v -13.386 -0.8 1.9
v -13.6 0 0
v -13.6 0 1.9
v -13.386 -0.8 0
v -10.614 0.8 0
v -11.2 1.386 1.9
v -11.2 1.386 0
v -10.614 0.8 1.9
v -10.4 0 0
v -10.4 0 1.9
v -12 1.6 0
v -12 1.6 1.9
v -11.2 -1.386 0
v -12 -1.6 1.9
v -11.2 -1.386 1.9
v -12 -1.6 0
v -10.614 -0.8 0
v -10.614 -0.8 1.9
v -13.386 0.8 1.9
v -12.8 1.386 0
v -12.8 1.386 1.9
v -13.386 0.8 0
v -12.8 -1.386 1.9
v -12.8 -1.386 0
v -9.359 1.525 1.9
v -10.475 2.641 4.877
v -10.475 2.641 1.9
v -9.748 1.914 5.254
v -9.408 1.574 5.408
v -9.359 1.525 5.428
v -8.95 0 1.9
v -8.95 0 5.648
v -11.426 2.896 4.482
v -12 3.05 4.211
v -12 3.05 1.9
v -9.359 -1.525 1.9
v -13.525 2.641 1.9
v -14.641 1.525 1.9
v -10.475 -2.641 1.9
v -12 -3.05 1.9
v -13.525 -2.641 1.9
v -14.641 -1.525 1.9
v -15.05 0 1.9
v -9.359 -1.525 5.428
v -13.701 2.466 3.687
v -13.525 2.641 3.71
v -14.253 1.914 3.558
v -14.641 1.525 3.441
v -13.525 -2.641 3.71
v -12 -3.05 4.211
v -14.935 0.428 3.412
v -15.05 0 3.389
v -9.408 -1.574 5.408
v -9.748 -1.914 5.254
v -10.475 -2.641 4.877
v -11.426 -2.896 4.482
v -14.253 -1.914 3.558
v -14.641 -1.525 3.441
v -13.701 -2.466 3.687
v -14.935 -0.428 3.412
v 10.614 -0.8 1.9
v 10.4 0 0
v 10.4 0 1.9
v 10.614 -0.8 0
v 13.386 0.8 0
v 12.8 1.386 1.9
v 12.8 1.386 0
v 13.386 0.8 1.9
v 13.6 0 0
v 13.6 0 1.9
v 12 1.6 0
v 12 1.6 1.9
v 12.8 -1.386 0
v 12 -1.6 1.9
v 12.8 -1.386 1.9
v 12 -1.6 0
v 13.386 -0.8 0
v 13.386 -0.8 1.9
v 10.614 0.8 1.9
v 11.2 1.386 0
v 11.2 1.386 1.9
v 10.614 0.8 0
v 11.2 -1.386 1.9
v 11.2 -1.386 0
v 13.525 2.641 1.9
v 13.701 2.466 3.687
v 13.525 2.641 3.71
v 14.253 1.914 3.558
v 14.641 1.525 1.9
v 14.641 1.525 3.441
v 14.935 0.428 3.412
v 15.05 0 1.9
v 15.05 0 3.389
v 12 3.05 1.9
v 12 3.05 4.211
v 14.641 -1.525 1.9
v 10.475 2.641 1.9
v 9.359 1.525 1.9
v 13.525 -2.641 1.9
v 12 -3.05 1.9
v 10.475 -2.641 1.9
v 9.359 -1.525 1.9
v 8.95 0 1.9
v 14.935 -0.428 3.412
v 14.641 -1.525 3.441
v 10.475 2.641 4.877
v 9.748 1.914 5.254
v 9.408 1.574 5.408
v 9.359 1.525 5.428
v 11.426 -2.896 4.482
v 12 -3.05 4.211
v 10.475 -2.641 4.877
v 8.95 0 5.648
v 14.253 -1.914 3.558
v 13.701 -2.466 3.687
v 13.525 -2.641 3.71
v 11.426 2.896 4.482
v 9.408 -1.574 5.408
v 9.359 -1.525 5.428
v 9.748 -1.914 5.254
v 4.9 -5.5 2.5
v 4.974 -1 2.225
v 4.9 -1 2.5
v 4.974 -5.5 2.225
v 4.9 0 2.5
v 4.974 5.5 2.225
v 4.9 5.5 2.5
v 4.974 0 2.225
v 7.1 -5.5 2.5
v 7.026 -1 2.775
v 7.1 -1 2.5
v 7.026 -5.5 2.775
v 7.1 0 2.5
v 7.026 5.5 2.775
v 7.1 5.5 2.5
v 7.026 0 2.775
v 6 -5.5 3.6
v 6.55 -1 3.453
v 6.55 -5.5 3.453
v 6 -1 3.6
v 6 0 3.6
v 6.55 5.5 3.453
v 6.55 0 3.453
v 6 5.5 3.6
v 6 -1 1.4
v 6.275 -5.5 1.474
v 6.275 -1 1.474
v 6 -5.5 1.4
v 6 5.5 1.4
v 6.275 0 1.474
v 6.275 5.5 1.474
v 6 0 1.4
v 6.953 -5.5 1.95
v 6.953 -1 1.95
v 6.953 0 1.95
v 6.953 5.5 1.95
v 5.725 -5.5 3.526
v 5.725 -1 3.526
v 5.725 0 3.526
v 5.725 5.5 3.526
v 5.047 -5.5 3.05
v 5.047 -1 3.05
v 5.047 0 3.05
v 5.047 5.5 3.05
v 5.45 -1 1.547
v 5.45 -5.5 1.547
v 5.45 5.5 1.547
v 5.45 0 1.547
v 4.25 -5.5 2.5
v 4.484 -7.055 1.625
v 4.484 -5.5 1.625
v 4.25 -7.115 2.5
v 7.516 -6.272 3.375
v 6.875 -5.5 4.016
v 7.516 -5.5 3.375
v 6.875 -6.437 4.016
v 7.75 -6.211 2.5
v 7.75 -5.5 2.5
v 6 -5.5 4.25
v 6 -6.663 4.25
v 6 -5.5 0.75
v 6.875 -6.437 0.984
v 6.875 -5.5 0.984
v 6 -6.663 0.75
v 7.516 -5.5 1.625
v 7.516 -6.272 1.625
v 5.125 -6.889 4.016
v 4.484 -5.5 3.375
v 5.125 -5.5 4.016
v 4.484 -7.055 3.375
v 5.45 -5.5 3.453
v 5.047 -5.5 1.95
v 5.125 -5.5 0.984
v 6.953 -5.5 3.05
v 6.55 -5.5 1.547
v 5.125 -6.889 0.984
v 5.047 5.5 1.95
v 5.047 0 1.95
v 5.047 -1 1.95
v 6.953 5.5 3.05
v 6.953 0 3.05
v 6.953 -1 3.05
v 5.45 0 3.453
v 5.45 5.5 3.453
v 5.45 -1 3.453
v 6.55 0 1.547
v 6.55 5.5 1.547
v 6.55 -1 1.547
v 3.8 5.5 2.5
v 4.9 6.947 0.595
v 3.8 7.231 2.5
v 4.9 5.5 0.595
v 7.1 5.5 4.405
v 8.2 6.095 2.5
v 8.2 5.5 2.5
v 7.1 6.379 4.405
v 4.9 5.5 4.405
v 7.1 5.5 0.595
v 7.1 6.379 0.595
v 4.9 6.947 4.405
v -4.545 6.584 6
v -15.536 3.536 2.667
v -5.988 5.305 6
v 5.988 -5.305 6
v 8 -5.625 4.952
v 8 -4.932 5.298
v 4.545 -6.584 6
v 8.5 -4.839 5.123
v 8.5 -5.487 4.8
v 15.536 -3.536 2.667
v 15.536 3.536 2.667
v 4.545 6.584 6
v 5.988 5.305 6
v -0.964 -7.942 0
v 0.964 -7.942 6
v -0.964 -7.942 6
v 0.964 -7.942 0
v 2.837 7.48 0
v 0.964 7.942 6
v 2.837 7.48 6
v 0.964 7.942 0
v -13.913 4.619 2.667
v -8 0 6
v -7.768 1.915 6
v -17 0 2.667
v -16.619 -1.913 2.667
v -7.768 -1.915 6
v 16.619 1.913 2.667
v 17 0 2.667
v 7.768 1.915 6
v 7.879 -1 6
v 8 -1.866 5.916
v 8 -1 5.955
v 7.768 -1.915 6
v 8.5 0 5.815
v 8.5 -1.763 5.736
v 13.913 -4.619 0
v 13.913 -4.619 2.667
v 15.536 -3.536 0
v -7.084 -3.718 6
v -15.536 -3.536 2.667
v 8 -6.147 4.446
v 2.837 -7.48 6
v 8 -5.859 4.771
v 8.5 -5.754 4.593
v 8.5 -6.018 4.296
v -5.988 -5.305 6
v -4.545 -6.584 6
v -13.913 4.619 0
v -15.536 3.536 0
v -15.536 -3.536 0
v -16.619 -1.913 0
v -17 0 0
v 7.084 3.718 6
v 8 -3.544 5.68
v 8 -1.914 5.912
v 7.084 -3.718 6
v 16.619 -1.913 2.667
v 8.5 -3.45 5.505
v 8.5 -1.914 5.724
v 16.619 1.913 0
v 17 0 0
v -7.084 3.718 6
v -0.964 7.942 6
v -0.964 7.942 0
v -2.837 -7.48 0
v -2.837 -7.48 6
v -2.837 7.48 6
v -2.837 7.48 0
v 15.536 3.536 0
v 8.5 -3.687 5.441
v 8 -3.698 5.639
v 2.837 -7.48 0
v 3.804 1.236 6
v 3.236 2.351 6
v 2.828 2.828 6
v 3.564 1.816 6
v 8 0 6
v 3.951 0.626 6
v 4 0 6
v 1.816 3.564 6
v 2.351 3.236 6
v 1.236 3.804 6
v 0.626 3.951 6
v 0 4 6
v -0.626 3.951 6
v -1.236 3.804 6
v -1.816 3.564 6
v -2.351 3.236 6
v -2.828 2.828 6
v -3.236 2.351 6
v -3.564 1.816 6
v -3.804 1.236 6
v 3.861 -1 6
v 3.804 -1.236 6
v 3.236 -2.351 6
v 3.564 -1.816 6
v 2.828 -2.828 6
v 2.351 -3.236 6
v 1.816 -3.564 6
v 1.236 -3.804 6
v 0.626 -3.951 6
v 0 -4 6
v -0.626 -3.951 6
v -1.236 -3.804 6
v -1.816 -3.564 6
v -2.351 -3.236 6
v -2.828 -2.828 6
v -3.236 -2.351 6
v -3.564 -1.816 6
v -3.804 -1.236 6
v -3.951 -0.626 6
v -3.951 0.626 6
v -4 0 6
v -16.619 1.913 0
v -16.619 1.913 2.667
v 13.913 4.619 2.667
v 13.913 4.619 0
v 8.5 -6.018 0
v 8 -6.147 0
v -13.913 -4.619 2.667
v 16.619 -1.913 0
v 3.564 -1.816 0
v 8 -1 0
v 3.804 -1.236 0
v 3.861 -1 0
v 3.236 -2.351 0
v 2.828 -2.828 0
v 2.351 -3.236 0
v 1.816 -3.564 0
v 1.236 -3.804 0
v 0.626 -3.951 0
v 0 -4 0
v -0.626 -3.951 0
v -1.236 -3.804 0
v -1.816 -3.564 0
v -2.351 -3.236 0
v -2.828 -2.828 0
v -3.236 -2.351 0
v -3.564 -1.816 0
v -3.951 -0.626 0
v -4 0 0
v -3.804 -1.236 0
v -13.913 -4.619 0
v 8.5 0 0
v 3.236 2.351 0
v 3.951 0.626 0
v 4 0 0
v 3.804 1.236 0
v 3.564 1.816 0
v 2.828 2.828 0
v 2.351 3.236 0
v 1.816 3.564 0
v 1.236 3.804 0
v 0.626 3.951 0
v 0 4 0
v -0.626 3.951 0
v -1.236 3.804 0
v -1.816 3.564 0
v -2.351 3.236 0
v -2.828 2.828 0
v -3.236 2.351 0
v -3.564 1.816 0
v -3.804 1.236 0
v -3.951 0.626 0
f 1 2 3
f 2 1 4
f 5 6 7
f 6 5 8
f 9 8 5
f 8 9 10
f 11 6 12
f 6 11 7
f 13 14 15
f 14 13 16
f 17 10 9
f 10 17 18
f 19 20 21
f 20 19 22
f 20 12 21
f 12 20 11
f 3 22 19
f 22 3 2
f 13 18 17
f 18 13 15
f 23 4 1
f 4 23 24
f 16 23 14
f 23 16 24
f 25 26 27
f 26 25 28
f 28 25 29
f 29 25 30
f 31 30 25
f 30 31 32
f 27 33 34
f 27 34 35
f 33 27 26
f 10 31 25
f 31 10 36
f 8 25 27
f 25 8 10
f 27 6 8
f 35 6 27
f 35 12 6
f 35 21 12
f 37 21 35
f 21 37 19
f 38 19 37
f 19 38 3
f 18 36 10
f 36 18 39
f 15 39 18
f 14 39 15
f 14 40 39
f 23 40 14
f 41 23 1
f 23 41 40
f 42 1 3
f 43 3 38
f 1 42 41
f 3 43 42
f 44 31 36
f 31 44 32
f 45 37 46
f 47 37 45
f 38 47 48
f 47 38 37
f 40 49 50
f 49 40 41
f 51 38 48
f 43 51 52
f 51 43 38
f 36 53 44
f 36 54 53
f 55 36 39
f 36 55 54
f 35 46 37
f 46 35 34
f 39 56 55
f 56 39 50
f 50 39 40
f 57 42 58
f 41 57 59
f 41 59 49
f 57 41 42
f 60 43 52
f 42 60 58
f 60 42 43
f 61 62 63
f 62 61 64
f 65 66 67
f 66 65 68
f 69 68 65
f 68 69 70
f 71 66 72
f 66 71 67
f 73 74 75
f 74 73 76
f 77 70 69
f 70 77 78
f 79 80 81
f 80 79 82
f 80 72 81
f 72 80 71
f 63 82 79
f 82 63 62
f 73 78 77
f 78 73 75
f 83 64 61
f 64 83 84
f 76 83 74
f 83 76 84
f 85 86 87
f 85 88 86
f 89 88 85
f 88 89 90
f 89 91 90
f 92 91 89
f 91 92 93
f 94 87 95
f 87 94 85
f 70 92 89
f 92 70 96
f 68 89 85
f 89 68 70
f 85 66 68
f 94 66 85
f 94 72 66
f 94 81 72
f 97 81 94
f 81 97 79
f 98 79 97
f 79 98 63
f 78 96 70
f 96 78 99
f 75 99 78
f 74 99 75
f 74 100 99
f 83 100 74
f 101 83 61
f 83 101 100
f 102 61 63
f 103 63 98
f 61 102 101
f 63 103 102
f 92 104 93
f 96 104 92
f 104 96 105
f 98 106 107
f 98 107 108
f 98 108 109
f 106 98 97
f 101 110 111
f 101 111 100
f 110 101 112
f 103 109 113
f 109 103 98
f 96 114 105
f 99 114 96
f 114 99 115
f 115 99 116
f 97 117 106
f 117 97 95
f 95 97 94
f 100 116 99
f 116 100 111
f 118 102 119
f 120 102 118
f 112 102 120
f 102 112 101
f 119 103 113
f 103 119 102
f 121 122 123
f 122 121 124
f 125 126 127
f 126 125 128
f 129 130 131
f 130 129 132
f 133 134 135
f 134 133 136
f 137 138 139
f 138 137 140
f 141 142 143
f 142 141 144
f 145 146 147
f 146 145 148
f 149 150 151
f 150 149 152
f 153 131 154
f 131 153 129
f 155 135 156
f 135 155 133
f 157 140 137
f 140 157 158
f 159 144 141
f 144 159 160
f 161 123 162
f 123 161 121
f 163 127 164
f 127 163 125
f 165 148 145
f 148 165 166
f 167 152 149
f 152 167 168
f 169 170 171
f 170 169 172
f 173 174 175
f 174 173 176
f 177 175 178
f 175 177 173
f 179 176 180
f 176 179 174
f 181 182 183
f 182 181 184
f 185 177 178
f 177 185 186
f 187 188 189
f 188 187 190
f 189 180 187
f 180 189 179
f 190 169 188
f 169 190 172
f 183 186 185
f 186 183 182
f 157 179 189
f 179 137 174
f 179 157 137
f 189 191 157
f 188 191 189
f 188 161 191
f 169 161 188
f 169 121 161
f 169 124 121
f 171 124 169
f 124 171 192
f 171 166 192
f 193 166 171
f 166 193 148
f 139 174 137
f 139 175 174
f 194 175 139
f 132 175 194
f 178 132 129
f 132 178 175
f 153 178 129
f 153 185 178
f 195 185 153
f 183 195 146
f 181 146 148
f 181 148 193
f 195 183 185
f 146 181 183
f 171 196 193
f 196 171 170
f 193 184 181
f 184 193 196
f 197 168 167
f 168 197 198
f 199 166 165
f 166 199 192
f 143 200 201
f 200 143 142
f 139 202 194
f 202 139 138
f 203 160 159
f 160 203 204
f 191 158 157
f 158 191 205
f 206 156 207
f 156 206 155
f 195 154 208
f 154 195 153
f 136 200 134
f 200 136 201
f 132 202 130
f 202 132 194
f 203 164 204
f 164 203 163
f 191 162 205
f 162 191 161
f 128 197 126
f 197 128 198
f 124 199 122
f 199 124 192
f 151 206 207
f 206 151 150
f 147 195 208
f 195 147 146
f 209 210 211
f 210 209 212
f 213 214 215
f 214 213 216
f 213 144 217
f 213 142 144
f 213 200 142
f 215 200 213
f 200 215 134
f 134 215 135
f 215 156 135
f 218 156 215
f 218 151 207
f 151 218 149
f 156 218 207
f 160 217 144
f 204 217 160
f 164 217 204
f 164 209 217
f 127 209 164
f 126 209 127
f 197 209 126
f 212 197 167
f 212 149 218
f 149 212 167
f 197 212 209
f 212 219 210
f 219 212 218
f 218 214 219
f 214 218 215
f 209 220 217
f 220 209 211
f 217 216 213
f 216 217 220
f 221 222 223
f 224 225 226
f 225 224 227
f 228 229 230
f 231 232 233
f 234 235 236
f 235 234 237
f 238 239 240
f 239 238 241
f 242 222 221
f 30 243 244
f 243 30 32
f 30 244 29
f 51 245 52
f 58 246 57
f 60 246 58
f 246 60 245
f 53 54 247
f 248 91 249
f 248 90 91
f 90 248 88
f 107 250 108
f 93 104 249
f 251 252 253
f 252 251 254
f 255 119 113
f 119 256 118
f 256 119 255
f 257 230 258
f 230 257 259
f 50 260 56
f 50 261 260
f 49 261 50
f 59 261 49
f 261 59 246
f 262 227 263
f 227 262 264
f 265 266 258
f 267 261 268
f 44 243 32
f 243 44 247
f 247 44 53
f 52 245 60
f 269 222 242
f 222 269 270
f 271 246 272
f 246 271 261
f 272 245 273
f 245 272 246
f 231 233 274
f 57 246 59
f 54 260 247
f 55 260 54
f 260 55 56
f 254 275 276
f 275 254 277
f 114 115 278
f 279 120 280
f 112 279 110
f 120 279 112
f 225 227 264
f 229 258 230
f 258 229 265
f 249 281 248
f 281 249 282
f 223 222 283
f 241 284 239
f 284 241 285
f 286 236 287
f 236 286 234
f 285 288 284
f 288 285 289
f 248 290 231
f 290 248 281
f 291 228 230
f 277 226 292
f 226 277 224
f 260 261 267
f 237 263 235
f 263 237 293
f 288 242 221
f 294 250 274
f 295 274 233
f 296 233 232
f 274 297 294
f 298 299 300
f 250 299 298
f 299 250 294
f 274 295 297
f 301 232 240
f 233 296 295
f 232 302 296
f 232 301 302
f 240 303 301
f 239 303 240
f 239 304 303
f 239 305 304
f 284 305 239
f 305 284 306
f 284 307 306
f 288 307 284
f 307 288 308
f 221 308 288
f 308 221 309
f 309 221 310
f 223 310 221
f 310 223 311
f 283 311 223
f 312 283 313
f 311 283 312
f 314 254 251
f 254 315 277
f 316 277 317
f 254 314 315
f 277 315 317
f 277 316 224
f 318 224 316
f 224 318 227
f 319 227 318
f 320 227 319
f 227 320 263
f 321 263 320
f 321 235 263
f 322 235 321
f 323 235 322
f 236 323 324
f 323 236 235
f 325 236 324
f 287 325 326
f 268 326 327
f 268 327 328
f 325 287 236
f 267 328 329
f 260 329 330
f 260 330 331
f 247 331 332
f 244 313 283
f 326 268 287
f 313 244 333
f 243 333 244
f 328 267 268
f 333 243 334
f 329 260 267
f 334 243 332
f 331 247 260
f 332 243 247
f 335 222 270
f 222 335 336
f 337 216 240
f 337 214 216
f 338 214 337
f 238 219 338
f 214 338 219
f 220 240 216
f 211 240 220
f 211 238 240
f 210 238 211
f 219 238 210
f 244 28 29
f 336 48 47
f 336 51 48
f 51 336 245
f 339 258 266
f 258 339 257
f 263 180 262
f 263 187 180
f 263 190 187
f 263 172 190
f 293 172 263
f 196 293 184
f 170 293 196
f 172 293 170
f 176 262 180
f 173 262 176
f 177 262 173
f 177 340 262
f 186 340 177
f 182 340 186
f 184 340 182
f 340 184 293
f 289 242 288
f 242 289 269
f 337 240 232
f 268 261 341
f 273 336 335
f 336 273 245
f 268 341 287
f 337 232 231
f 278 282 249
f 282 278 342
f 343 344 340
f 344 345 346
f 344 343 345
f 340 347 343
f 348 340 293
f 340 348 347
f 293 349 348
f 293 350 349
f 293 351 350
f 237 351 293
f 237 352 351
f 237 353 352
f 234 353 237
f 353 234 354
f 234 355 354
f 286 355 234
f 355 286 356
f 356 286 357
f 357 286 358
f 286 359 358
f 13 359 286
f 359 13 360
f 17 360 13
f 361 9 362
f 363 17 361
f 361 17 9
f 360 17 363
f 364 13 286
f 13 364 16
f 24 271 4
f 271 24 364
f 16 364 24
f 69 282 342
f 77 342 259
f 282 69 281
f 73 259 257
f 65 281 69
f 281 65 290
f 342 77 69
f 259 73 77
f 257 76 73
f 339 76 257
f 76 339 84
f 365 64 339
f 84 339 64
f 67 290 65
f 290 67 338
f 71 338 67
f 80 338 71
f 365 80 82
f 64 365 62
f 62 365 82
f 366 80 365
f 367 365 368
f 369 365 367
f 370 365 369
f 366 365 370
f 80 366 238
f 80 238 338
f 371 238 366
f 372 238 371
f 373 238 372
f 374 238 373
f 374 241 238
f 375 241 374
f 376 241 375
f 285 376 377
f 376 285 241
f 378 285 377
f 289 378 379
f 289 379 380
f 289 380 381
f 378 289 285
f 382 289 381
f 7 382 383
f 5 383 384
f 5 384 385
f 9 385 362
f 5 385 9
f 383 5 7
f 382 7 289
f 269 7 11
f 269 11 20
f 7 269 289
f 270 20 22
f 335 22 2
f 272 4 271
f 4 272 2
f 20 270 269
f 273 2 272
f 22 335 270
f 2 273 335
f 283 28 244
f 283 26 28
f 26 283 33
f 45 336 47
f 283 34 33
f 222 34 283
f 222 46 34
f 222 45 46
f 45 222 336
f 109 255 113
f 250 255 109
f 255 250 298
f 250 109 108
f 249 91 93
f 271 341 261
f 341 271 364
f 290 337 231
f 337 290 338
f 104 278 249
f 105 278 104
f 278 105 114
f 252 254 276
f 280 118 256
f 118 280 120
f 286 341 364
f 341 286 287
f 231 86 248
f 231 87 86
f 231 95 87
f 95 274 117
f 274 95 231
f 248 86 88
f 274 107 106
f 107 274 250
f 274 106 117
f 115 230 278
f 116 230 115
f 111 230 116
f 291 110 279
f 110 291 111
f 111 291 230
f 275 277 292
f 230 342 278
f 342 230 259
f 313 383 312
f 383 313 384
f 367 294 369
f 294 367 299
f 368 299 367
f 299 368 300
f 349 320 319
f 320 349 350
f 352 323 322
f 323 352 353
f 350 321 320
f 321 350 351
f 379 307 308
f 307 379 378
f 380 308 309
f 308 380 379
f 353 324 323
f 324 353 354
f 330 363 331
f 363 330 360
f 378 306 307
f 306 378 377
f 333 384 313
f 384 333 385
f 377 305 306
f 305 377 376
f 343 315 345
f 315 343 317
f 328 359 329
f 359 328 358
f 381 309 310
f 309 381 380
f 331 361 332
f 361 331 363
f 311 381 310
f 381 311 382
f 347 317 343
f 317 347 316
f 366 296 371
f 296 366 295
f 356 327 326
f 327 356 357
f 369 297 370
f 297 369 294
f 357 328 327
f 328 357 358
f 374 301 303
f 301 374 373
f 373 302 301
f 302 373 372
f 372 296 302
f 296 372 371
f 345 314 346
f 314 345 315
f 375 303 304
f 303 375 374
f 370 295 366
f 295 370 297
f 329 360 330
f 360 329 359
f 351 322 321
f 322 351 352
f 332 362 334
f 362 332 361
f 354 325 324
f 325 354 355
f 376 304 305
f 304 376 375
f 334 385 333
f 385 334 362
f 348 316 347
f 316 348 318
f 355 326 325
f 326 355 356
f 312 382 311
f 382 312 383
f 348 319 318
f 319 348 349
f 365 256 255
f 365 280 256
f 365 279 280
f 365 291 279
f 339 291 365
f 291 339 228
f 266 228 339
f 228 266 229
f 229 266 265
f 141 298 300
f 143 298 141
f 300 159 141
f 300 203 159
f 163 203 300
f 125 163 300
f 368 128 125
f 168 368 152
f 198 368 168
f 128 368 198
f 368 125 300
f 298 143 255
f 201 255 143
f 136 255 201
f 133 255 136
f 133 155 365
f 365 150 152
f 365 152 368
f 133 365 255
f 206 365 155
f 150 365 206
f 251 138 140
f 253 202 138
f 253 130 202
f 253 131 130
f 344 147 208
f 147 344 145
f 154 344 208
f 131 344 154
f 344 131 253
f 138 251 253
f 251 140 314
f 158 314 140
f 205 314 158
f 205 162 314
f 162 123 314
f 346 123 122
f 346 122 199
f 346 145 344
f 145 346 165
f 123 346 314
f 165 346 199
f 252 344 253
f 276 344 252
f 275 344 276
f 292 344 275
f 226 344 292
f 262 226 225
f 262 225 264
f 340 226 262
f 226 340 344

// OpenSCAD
// Rod Diameter (mm)
rod_dia = 8;

// Clearance (mm)
clearance = 0.0;

module rail_mount() {
    end_height=rod_dia/3;
    center_height=rod_dia*3/4;
    difference() {
        hull() {
            zmove(end_height/2) xspread(rod_dia*3) cylinder(d=rod_dia*1.25, h=end_height, center=true);
            zmove(center_height/2) cylinder(d=rod_dia*2, h=rod_dia*3/4, center=true);
        }
        zmove(center_height/2-0.1) cylinder(d=rod_dia+clearance, h=center_height+0.3, center=true, $fn=40);
        zmove(-0.1) xspread(rod_dia*3) screw_hole(3.2, center_height, 6.1, rod_dia/2, center=false);
        zmove(-0.1) ymove(-1) cube([rod_dia+0.5, 1, rod_dia]);
        zmove(-0.1) xmove(rod_dia) ymove(-rod_dia) cube([0.5, rod_dia, rod_dia]);
        zmove(rod_dia*5/16) ymove(rod_dia*7/8) xmove(rod_dia*3/4) xrotate(90) screw_hole(2.2, rod_dia*15/8, 3.5, 2.5, center=false);
        zmove(rod_dia*5/16) ymove(rod_dia) xmove(rod_dia*3/4) xrotate(90) zrotate(30) screw_hole(2.2, rod_dia*15/8, 4.4, -2.5, type="hex", center=false);
    }
}

rail_mount();



// mygeom.scad
module rotate_axis(axis, d) {
    rotate(list_for_axis(axis, d)) children();
}

module xrotate(d) {
    rotate_axis("x", d) children();
}

module yrotate(d) {
    rotate_axis("y", d) children();
}

module zrotate(d) {
    rotate_axis("z", d) children();
}

function list_for_axis(axis, d) =
(
    axis=="x" ? [d, 0, 0] : (
        axis=="y" ? [0, d, 0] : (
            axis=="z" ? [0, 0, d] : [0, 0, 0]))
);

module translate_axis(axis, d) {
    translate(list_for_axis(axis, d)) children();
}

module xmove(d) {
    translate_axis("x", d) children();
}

module ymove(d) {
    translate_axis("y", d) children();
}

module zmove(d) {
    translate_axis("z", d) children();
}

module spread_axis(axis, d, n=1) {
    x = d/2;
    if(n==0) {
        children();
    }
    else
    {
        for(i=[-x:(d/n):x]) {
            translate_axis(axis, i) children();
        }
    } 
}

module xspread(d, n=1)
{
    spread_axis("x", d, n) children();
}

module yspread(d, n=1)
{
    spread_axis("y", d, n) children();
}


module zspread(d, n=1)
{
    spread_axis("z", d, n) children();
}

module star(points, id, od)
{
    polygon([
        for(i=[0:points*2])
            [
            (i%2==0) ? cos(i*(360/(points*2)))*od/2 : cos(i*(360/(points*2)))*id/2,
            (i%2==0) ? sin(i*(360/(points*2)))*od/2 : sin(i*(360/(points*2)))*id/2
            ]
    ]);
}

module unit_star(points, height, id, od, center=true)
{
    linear_extrude(height, center=center) star(points, id, od);
}

module unit_polygon(r, n)
{
    polygon([
        for(i=[0:360/n:360])
            [ cos(i)*r, sin(i)*r ]
    ]);
}


module screw_hole(size, depth, sinkwidth=5, sinkdepth=0, type="round", center=true) {
    zmove(center ? 0 : depth/2) {
        cylinder(h=depth, d=size, $fn=12, center=true);
        ref=sinkdepth/abs(sinkdepth) * depth/2;
        zmove(ref-sinkdepth/2) {
            if(type=="round") cylinder(h=abs(sinkdepth), d=sinkwidth, $fn=12, center=true);
            if(type=="hex") linear_extrude(height=abs(sinkdepth), center=true) rotate([0, 0, 30]) unit_polygon(sinkwidth/2, 6);
        }
    }
}

module rounded_cube(size, diameter, center=false) {
    hull() {
        xmove((size[0])/2) xspread(size[0]-diameter) ymove((size[1])/2) yspread(size[1]-diameter) cylinder(d=diameter, h=size[2], center=center);
    }
}

module round_chamfer() {
    intersection() {
        cylinder(d=4, h=11, $fn=20);
        cube(size=[2, 2, 11]);
    }
}
